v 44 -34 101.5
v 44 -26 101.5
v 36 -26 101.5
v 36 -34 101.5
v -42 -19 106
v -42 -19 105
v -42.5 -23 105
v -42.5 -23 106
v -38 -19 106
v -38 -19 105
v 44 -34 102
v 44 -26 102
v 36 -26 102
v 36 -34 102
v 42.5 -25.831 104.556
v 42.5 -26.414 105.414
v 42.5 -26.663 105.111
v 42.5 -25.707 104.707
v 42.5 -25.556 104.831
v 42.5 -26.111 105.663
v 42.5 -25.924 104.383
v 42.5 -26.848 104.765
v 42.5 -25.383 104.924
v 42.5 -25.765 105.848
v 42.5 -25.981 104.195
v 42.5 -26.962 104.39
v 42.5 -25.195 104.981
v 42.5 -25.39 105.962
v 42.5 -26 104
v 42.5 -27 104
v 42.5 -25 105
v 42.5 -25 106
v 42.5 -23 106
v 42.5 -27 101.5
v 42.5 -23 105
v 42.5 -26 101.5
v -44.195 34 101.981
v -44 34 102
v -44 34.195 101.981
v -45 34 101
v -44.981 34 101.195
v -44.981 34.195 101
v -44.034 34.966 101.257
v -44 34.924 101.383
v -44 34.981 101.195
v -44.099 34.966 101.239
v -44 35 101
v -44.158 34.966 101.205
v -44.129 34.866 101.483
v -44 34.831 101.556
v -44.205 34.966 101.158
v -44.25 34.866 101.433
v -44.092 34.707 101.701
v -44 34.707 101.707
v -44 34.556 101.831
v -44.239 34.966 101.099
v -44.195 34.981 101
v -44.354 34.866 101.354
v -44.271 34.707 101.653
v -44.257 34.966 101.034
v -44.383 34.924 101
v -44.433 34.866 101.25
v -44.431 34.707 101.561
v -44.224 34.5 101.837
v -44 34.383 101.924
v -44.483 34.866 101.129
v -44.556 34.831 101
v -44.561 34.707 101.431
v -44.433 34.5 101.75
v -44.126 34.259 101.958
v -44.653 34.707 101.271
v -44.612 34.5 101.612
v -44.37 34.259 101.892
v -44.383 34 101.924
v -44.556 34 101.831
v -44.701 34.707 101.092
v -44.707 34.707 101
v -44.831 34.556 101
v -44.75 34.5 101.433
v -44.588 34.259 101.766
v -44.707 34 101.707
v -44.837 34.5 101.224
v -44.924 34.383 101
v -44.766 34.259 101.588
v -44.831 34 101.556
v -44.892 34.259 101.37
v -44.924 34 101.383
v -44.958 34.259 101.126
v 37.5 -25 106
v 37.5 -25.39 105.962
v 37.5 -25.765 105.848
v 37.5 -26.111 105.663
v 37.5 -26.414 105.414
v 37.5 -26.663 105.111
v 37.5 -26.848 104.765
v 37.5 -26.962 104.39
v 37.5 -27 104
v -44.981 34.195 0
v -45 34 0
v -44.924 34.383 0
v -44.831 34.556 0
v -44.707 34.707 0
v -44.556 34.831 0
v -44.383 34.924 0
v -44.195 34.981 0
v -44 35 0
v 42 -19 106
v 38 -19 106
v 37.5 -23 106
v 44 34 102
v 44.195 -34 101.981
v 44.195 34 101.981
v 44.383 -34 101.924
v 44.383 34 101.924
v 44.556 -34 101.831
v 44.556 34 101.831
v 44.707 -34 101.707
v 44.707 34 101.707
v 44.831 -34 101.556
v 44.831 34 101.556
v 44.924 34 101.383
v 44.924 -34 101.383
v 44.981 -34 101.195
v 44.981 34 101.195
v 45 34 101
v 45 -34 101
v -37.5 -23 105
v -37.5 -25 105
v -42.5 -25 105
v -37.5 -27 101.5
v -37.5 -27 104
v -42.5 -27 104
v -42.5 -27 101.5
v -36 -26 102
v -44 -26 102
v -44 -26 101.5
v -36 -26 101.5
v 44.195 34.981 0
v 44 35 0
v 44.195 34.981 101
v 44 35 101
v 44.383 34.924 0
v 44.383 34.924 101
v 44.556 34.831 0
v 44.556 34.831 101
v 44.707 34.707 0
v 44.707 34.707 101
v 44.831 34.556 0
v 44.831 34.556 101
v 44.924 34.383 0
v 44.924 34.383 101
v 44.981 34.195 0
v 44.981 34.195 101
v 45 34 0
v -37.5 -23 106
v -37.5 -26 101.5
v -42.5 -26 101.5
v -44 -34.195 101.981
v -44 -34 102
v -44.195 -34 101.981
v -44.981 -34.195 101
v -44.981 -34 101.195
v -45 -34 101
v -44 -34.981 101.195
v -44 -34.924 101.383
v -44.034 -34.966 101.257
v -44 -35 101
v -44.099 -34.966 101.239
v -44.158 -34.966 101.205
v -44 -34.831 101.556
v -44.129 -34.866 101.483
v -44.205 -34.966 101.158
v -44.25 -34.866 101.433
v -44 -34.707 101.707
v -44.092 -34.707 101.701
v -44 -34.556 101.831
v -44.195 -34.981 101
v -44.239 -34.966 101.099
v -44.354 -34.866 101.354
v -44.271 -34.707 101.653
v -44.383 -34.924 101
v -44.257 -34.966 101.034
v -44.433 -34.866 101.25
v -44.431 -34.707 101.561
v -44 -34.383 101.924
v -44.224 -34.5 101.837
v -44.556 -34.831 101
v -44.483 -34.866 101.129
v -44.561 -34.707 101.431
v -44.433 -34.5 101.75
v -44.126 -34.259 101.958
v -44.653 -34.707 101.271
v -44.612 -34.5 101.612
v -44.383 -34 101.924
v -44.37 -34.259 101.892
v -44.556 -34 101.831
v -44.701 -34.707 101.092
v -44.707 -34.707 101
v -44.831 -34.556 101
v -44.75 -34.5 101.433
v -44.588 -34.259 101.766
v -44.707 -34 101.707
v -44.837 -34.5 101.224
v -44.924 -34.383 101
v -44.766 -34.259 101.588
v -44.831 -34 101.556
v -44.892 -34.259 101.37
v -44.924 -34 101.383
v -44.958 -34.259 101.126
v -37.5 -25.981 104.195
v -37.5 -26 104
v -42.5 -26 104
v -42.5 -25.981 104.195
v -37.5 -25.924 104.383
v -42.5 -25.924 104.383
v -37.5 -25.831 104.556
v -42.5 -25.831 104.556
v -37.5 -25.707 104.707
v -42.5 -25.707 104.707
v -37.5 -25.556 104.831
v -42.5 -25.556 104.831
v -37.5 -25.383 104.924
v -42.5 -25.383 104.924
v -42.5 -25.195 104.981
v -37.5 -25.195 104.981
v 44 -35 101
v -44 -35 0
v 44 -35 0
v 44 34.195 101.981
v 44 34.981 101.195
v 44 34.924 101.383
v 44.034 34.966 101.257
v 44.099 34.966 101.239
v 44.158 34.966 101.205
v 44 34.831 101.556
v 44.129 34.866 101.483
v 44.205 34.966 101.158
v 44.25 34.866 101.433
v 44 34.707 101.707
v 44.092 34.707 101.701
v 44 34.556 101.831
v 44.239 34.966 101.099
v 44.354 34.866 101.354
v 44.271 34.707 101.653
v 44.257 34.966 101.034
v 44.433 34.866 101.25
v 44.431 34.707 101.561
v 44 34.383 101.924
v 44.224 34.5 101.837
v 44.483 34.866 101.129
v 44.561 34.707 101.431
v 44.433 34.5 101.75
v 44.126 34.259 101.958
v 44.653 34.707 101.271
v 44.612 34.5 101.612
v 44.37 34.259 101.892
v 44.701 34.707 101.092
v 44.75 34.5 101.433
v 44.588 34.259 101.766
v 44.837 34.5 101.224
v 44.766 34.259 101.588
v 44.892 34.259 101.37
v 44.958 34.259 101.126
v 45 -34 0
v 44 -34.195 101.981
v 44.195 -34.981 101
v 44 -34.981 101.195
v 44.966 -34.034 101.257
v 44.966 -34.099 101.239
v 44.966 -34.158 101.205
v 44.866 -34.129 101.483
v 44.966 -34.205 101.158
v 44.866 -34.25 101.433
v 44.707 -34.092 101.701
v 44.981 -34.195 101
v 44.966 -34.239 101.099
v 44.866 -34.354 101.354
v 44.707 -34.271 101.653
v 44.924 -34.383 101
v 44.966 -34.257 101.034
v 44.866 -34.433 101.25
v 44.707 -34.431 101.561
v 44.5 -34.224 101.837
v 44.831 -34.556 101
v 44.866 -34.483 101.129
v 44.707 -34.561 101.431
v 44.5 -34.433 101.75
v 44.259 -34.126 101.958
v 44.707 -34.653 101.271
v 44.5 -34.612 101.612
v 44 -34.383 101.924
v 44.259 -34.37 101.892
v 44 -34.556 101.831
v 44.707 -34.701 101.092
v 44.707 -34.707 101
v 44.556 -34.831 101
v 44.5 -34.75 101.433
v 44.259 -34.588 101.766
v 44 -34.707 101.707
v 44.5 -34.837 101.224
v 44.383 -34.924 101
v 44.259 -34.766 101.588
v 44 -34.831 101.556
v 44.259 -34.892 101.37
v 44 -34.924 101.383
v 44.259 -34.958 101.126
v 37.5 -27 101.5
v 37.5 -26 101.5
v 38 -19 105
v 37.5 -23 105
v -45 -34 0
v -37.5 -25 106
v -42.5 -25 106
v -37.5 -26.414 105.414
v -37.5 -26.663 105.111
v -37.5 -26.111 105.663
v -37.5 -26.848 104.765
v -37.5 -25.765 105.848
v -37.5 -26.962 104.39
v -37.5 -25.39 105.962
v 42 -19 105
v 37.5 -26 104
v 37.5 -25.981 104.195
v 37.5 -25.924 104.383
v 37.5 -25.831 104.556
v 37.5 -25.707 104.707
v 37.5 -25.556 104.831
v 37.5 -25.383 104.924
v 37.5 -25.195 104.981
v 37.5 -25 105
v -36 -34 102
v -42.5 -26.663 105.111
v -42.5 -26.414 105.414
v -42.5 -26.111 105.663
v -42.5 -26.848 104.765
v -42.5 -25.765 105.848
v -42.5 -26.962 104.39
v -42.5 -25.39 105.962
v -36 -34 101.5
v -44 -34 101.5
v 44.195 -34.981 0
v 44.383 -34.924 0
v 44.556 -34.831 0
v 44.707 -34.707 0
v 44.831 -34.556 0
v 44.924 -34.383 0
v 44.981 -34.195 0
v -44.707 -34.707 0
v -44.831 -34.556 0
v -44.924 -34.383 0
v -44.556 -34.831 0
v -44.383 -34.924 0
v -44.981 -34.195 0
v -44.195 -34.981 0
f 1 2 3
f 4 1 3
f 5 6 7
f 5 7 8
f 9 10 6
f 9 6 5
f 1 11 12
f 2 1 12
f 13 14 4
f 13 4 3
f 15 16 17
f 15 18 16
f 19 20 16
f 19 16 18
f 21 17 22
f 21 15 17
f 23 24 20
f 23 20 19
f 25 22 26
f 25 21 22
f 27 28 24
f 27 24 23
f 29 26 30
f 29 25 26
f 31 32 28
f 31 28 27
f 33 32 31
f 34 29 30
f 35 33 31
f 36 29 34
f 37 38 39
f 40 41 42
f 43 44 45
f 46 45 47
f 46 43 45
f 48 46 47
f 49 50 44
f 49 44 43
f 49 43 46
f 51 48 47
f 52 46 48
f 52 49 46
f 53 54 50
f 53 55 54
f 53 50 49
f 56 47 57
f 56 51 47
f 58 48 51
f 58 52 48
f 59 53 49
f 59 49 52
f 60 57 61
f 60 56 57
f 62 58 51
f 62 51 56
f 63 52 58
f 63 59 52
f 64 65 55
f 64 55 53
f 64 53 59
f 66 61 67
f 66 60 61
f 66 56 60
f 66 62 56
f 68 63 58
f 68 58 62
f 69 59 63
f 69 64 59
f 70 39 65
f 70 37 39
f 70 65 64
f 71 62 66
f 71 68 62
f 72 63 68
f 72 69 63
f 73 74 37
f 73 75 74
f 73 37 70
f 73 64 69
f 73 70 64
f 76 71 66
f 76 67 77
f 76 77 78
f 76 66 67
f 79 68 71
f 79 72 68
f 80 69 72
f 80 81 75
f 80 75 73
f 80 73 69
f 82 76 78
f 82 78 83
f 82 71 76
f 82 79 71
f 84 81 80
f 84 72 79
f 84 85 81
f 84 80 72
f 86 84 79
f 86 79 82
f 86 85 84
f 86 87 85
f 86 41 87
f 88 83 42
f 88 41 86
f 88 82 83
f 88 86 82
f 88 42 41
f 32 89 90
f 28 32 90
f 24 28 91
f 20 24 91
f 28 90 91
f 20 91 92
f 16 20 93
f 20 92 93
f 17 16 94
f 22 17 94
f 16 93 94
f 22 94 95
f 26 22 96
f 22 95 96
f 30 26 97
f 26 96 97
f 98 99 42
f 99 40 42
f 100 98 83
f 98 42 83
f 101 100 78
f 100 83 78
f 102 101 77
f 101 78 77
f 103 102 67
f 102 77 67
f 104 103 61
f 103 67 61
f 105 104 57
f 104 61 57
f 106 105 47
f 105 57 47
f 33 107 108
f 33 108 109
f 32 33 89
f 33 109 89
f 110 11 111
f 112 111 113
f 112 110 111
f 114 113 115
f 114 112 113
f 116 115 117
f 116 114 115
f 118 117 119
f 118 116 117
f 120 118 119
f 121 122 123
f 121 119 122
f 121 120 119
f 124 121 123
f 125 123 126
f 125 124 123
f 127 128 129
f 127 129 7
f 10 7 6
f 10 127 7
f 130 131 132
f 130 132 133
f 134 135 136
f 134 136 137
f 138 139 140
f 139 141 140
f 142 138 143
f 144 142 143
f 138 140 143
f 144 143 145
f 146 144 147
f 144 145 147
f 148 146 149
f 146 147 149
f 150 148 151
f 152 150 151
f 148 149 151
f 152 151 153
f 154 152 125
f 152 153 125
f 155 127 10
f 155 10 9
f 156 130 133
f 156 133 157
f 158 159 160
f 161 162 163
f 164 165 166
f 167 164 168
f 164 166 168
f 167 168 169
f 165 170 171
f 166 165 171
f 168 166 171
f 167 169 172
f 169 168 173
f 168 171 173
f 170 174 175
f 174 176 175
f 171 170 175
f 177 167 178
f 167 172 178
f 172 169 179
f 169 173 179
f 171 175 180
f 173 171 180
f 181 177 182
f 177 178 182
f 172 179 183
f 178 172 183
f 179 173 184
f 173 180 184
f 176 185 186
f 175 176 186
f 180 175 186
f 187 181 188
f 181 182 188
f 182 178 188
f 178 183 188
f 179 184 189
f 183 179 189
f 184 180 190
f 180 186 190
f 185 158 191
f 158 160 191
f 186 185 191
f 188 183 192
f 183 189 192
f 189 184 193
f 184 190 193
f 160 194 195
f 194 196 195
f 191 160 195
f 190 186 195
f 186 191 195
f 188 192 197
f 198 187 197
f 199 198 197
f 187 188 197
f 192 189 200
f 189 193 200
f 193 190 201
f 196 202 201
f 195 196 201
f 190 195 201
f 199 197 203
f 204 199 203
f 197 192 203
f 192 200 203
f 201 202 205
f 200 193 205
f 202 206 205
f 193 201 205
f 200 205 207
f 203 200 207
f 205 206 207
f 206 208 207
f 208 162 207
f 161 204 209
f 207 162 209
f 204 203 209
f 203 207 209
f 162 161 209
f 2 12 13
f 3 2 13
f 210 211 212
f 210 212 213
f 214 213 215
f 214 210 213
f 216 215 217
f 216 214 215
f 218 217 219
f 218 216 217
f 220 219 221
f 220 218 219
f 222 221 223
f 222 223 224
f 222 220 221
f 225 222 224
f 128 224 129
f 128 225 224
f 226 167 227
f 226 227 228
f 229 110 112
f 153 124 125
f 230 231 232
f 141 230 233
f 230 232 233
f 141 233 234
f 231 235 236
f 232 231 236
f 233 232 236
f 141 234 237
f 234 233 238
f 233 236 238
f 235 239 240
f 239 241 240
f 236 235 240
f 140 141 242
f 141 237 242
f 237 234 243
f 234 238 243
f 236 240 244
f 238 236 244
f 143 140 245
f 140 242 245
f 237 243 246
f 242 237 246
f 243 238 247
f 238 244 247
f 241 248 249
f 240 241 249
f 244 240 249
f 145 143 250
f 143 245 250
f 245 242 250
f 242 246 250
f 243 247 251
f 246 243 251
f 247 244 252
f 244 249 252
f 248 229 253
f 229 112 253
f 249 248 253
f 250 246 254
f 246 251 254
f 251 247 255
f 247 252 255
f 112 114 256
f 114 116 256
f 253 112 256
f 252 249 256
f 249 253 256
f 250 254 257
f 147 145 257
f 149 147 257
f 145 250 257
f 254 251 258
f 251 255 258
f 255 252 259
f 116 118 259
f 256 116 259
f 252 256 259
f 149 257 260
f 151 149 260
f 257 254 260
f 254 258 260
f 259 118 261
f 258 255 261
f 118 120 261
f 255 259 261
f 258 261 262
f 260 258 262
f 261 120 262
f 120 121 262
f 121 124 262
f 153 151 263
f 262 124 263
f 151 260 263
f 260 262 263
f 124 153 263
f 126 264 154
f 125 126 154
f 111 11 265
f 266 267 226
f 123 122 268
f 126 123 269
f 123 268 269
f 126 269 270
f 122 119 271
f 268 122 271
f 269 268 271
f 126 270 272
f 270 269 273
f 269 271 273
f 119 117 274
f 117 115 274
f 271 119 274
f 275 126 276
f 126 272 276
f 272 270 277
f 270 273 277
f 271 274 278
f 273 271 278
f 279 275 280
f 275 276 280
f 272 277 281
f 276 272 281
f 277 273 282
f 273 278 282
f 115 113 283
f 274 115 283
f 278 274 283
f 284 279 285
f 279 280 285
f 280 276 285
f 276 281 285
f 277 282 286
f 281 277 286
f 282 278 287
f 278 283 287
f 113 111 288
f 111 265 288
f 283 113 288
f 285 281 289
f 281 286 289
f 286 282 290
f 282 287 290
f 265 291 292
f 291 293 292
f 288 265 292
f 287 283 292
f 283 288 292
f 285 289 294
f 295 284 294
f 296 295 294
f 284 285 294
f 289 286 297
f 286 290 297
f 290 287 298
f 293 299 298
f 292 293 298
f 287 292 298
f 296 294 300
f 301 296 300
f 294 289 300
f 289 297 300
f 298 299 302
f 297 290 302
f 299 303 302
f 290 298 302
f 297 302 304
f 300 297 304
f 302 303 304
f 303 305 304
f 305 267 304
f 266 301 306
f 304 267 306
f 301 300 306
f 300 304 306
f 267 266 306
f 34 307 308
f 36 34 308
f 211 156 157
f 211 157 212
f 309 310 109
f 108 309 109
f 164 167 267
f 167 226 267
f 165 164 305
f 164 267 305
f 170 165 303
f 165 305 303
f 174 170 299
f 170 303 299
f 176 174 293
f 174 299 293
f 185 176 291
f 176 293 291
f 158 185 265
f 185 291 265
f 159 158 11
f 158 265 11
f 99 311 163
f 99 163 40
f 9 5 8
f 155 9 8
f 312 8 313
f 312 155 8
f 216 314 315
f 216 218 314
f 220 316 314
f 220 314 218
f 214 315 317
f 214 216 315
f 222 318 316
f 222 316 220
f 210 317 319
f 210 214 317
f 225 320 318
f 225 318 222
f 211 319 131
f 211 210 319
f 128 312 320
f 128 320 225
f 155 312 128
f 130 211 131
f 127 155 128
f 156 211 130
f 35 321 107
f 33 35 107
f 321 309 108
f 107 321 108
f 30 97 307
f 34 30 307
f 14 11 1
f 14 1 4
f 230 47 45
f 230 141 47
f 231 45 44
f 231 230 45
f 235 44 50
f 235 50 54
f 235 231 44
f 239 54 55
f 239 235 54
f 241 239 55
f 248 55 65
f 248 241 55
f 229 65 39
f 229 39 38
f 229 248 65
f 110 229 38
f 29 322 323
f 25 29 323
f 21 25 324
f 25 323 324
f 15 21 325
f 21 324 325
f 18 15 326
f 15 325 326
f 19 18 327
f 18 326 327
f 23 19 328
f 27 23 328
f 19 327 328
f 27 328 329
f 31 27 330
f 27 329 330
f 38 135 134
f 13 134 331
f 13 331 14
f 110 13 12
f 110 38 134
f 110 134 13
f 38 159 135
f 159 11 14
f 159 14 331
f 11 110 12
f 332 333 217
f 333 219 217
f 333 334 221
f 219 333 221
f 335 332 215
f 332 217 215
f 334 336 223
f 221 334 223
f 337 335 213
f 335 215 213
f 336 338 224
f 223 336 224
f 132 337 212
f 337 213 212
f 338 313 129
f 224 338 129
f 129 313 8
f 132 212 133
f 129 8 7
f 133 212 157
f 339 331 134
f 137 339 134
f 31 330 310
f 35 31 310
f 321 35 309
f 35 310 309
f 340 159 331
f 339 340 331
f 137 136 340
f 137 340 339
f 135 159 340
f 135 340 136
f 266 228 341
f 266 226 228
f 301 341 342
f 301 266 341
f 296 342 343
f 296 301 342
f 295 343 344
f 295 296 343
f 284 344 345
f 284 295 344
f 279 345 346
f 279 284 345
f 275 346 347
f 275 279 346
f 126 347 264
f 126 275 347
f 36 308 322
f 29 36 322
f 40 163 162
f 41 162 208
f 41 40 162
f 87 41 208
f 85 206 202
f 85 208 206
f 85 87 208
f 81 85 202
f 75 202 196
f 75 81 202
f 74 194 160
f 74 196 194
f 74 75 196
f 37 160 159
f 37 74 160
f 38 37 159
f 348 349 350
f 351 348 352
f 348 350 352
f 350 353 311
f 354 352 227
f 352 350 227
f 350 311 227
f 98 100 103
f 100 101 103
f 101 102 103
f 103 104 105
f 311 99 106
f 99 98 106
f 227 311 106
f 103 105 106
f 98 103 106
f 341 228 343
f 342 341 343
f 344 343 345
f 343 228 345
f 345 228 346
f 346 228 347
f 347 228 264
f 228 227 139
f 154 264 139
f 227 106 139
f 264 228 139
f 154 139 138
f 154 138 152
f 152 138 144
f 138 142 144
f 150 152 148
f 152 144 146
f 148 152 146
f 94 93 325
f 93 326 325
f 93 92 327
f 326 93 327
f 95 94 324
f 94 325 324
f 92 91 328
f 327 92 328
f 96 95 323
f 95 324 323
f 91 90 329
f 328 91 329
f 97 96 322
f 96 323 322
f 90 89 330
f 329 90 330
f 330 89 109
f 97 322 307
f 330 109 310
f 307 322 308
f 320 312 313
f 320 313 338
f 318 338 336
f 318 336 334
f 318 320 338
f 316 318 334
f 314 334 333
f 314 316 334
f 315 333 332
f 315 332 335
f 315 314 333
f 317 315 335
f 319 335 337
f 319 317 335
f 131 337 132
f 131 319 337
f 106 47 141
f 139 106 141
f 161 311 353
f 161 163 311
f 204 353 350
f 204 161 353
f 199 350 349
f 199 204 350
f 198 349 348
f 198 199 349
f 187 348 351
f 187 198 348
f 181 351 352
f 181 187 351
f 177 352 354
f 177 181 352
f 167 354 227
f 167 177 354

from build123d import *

# Parameters (mm, degrees)
SKETCH_1_W             = 90
SKETCH_1_H             = 70
EXTRUDE_1_DEPTH        = 102
SKETCH_2_W             = 8
SKETCH_2_H             = 8
CUT_EXTRUDE_1_DEPTH    = 0.5
FILLET_1_R             = 1
SM_BASE_FLANGE_1_DEPTH = 5
CHAMFER_1_SIZE         = 0.5
CHAMFER_1_SIZE2        = 4
CHAMFER_2_SIZE         = 4
CHAMFER_2_SIZE2        = 0.5


with BuildPart() as part:
    # Sketch 1 → 填料-伸長1 (new body)
    with BuildSketch(Plane.XY):
        Rectangle(SKETCH_1_W, SKETCH_1_H)
    extrude(amount=EXTRUDE_1_DEPTH)

    # Sketch 2 → 除料-伸長1 (cut)
    with BuildSketch(Plane.XY.offset(102)):
        with Locations((-40, -30)):
            Rectangle(SKETCH_2_W, SKETCH_2_H)
    cut_extrude_1 = extrude(amount=-CUT_EXTRUDE_1_DEPTH, mode=Mode.SUBTRACT)

    # 鏡射1: 除料-伸長1 across plane
    add(cut_extrude_1.mirror(Plane(origin=(0, 0, 0), x_dir=(0, 0, 1), z_dir=(1, 0, 0))), mode=Mode.SUBTRACT)

    # 圓角1
    fillet_1_edges = [part.edges().sort_by_distance(p)[0] for p in [
        (-45, 0, 102),
        (0, -35, 102),
        (45, 0, 102),
        (0, 35, 102),
        (45, -35, 51),
        (-45, -35, 51),
        (-45, 35, 51),
        (45, 35, 51),
    ]]
    fillet(fillet_1_edges, radius=FILLET_1_R - 0.0001)  # a hair under: the kernel refuses the full size


with BuildPart() as body_2:
    # 基材-凸緣1: sheet metal written as solids
    # 草圖4 → 基材-凸緣1 (new body)
    with BuildSketch(Plane.ZY.offset(37.5)):
        with BuildLine():
            Line((101.5, -26), (104, -26))
            ThreePointArc((104, -26), (104.707106781, -25.707106781), (105, -25))
            Line((105, -25), (105, -19))
            Line((105, -19), (106, -19))
            Line((106, -19), (106, -25))
            ThreePointArc((106, -25), (105.414213562, -26.414213562), (104, -27))
            Line((104, -27), (101.5, -27))
            Line((101.5, -27), (101.5, -26))
        make_face()
    extrude(amount=SM_BASE_FLANGE_1_DEPTH)

    # 導角1
    chamfer_1_edges = [body_2.edges().sort_by_distance(p)[0] for p in [
        (-37.5, -19, 105.5),
    ]]
    chamfer_1_side = [body_2.faces().sort_by_distance(p)[0] for p in [
        (-40, -19, 105.5),
    ]]
    chamfer(chamfer_1_edges, length=CHAMFER_1_SIZE, length2=CHAMFER_1_SIZE2, reference=chamfer_1_side[0])

    # 導角2
    chamfer_2_edges = [body_2.edges().sort_by_distance(p)[0] for p in [
        (-42.5, -19, 105.5),
    ]]
    chamfer_2_side = [body_2.faces().sort_by_distance(p)[0] for p in [
        (-42.5, -26.908212201, 102.75),
    ]]
    chamfer(chamfer_2_edges, length=CHAMFER_2_SIZE, length2=CHAMFER_2_SIZE2, reference=chamfer_2_side[0])


with BuildPart() as body_3:
    # 鏡射2: read off the stored shape, not the designer's step
    # 鏡射2: mirrored copy
    add(body_2.part.mirror(Plane.YZ))


solid = Compound([part.part, body_2.part, body_3.part])
